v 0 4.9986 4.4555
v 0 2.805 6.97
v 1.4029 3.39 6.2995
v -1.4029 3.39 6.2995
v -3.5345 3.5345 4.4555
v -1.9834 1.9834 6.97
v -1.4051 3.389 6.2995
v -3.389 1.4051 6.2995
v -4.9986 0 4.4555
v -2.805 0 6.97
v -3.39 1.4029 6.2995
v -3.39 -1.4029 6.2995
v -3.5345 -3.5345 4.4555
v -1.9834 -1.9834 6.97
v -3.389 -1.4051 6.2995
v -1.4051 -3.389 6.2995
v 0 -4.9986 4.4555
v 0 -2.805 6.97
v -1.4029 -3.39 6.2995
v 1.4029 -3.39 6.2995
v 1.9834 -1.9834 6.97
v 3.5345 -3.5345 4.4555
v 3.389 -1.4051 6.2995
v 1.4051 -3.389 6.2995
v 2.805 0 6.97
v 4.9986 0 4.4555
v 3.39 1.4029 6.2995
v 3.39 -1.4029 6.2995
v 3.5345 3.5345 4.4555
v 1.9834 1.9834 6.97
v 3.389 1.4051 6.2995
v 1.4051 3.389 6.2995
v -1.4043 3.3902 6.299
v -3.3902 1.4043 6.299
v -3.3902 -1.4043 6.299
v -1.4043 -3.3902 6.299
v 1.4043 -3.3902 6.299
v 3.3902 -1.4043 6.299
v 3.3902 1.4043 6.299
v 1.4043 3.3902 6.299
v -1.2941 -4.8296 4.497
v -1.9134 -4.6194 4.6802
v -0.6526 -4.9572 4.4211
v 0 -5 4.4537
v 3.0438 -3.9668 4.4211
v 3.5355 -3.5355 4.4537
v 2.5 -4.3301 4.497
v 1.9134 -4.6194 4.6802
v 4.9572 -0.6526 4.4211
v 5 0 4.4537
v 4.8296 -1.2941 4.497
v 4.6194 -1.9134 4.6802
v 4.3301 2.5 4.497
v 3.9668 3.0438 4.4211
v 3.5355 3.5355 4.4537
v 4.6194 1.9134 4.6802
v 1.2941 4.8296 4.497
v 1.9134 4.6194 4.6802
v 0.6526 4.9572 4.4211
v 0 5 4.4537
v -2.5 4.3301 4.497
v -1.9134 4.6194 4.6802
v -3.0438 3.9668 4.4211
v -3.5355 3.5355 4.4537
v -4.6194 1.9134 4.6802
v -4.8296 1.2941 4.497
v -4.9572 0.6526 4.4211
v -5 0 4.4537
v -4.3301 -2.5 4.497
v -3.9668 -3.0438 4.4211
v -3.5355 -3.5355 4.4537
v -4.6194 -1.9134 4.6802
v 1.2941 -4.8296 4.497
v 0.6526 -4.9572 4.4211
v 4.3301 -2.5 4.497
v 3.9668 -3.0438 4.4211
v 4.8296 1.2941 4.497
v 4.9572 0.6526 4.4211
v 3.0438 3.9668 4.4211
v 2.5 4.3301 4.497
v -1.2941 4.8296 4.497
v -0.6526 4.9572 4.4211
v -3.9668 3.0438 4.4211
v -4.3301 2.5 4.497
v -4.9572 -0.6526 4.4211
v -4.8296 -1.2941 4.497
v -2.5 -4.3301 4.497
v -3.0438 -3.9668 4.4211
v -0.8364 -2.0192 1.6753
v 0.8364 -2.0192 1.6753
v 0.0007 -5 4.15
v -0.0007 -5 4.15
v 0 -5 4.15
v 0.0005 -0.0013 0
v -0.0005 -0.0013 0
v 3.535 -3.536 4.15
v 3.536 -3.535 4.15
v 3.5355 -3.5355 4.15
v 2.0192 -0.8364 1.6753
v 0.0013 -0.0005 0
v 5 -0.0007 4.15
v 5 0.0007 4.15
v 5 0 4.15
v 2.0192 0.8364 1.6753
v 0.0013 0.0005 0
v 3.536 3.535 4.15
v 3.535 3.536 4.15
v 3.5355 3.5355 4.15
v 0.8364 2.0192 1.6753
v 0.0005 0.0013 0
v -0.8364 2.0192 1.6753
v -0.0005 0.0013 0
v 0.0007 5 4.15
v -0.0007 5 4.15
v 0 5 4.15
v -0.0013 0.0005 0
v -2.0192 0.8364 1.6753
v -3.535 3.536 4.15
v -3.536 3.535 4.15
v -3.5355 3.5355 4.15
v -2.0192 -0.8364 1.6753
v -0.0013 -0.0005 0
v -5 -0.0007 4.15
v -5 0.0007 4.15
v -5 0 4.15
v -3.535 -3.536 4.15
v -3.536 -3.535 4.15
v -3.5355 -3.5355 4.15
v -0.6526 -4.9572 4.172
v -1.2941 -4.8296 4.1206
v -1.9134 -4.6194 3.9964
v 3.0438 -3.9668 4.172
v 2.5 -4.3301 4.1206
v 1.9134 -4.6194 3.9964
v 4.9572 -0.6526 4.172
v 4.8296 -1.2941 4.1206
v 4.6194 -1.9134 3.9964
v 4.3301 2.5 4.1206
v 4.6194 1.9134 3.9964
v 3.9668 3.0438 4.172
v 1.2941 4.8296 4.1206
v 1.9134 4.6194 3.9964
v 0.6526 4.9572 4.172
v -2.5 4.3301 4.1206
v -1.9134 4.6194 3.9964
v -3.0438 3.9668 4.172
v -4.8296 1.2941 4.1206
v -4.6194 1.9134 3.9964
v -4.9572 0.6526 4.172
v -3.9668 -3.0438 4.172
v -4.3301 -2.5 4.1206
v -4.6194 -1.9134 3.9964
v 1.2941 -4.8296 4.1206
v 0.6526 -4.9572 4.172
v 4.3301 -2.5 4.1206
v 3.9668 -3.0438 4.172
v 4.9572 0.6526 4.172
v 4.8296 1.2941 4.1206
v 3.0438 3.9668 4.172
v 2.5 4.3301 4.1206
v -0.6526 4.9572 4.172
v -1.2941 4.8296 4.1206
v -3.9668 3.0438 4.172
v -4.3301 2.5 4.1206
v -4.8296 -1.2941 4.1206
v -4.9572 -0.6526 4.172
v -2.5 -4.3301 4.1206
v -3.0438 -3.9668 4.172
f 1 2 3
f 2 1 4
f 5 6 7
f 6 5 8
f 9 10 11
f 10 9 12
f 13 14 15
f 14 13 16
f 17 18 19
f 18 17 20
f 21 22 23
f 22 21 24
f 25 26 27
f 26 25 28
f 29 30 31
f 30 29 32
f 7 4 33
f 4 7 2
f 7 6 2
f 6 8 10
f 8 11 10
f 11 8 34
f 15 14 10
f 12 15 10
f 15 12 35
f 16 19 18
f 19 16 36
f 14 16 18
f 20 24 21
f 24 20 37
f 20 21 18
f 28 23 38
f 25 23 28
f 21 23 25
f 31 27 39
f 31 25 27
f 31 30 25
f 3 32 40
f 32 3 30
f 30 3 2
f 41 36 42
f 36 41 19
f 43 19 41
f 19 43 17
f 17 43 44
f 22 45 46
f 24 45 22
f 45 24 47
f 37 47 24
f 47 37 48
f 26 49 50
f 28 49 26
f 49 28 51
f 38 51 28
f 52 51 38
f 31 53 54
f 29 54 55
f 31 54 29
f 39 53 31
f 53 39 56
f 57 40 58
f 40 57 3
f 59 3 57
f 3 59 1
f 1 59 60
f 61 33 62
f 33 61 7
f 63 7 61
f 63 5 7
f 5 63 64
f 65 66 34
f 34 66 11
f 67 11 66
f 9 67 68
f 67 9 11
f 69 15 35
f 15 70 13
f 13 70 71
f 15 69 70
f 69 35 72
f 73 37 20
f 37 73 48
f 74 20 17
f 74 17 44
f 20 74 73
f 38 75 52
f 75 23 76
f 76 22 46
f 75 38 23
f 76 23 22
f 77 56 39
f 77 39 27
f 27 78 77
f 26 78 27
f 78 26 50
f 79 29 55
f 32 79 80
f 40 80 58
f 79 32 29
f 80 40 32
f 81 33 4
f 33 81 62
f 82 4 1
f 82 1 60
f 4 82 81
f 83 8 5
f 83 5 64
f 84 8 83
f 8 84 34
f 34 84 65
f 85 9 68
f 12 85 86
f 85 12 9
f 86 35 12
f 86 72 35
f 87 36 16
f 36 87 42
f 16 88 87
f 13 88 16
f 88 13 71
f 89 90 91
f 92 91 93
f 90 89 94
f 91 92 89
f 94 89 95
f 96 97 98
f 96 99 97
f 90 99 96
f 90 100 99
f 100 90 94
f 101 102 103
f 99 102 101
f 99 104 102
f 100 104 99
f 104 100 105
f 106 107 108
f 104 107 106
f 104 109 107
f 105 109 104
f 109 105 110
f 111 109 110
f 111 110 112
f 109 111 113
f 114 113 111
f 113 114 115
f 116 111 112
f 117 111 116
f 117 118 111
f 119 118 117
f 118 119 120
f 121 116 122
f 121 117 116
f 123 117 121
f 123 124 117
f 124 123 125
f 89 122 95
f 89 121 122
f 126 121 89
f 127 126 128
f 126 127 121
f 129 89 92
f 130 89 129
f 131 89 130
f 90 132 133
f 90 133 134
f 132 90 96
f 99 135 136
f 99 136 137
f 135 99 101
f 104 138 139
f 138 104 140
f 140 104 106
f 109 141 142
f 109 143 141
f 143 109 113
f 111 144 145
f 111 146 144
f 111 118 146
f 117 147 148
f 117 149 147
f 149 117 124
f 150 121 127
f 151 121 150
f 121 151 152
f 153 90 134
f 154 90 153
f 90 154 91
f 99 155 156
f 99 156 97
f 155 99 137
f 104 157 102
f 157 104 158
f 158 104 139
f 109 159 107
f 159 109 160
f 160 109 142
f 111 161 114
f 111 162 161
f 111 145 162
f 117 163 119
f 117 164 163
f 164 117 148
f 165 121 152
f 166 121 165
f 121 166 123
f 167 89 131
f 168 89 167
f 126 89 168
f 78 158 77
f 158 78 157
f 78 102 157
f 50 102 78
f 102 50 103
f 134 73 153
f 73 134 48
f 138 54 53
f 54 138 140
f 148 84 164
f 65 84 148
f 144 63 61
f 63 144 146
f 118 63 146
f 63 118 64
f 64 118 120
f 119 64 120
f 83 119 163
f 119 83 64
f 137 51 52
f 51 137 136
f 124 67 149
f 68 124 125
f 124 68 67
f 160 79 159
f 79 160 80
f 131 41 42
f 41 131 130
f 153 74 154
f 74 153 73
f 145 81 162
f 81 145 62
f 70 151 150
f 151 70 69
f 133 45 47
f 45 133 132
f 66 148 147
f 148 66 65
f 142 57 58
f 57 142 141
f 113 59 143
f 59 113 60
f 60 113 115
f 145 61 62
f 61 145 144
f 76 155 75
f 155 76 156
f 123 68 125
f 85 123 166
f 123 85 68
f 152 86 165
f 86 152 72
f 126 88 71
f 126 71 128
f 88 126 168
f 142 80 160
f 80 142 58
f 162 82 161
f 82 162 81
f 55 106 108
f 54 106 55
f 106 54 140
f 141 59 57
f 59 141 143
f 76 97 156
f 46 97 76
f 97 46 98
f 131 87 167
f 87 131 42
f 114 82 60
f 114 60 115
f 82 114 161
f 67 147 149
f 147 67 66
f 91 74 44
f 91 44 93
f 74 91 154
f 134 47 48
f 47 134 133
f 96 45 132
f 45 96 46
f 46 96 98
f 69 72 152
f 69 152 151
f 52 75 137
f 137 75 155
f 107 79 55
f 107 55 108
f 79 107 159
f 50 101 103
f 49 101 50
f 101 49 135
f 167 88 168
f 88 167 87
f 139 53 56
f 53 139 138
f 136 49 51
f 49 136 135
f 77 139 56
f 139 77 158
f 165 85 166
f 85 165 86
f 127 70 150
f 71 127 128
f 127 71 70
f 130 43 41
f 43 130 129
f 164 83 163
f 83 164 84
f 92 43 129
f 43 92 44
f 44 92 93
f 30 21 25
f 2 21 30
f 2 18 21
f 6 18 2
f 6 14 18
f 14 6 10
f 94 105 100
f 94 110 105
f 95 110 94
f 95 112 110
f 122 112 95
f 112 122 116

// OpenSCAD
Color_Red=240; // [0:255]
Color_Green=10; // [0:255]
Color_Blue=10; // [0:255]
Color_Alpha=.9; // [0:.1:.9]
Crown_Height=19.2; // [14:.1:19.2]
Pavilion_Depth=41.5; // [40:.1:43.4]
Table_Diameter=56.1; // [53:.1:59]
Crown_Angle=41.1; // [34:.1:41.1]
Pavilion_Angle=39.7; // [39.7:.1:41.7]
//$vpr=[60,0,30];
//$vpd=67;

color([Color_Red/255,Color_Green/255,Color_Blue/255,Color_Alpha])difference(){
translate([0,0,-.00001])cylinder(d=10,h=7,$fn=16*3);
//Table
translate([-6,-6,Crown_Height/10+.9+Pavilion_Depth/10])cube(12);
//Crown
//Kite Fasets
for(i=[0:7])
rotate([0,0,i*45])translate([-6,Table_Diameter/20,Crown_Height/10+.9+Pavilion_Depth/10])rotate([Crown_Angle-90])cube(12);
//star Fasets
for(i=[0:7])
rotate([0,0,i*45+22.5])translate([-6,Table_Diameter/20*cos(22.5),Crown_Height/10+.9+Pavilion_Depth/10])rotate([Crown_Angle-73])cube(12);
//Upper Girdle Fasets
for(j=[-1,1])for(i=[0:7])
rotate([0,0,i*45+j*6])
translate([0,-5,Pavilion_Depth/10+.2689])
rotate([100.66+Crown_Angle,0,0])translate([-6,0,-12])cube(12);
//culet
translate([0,0,-1])cube(2,true);

//Pavilion
//Main Facets
for(i=[0:7])
rotate([0,0,i*45])
translate([0,-5,Pavilion_Depth/10])
rotate([-Pavilion_Angle,0,0])translate([-6,0,-12])cube(12);
//Lower Girdle Facets
for(j=[-1,1])for(i=[0:7])
rotate([0,0,i*45+j*6])
translate([0,-5,Pavilion_Depth/10+.0235])
rotate([-Pavilion_Angle-1,0,0])translate([-6,0,-12])cube(12);
}
